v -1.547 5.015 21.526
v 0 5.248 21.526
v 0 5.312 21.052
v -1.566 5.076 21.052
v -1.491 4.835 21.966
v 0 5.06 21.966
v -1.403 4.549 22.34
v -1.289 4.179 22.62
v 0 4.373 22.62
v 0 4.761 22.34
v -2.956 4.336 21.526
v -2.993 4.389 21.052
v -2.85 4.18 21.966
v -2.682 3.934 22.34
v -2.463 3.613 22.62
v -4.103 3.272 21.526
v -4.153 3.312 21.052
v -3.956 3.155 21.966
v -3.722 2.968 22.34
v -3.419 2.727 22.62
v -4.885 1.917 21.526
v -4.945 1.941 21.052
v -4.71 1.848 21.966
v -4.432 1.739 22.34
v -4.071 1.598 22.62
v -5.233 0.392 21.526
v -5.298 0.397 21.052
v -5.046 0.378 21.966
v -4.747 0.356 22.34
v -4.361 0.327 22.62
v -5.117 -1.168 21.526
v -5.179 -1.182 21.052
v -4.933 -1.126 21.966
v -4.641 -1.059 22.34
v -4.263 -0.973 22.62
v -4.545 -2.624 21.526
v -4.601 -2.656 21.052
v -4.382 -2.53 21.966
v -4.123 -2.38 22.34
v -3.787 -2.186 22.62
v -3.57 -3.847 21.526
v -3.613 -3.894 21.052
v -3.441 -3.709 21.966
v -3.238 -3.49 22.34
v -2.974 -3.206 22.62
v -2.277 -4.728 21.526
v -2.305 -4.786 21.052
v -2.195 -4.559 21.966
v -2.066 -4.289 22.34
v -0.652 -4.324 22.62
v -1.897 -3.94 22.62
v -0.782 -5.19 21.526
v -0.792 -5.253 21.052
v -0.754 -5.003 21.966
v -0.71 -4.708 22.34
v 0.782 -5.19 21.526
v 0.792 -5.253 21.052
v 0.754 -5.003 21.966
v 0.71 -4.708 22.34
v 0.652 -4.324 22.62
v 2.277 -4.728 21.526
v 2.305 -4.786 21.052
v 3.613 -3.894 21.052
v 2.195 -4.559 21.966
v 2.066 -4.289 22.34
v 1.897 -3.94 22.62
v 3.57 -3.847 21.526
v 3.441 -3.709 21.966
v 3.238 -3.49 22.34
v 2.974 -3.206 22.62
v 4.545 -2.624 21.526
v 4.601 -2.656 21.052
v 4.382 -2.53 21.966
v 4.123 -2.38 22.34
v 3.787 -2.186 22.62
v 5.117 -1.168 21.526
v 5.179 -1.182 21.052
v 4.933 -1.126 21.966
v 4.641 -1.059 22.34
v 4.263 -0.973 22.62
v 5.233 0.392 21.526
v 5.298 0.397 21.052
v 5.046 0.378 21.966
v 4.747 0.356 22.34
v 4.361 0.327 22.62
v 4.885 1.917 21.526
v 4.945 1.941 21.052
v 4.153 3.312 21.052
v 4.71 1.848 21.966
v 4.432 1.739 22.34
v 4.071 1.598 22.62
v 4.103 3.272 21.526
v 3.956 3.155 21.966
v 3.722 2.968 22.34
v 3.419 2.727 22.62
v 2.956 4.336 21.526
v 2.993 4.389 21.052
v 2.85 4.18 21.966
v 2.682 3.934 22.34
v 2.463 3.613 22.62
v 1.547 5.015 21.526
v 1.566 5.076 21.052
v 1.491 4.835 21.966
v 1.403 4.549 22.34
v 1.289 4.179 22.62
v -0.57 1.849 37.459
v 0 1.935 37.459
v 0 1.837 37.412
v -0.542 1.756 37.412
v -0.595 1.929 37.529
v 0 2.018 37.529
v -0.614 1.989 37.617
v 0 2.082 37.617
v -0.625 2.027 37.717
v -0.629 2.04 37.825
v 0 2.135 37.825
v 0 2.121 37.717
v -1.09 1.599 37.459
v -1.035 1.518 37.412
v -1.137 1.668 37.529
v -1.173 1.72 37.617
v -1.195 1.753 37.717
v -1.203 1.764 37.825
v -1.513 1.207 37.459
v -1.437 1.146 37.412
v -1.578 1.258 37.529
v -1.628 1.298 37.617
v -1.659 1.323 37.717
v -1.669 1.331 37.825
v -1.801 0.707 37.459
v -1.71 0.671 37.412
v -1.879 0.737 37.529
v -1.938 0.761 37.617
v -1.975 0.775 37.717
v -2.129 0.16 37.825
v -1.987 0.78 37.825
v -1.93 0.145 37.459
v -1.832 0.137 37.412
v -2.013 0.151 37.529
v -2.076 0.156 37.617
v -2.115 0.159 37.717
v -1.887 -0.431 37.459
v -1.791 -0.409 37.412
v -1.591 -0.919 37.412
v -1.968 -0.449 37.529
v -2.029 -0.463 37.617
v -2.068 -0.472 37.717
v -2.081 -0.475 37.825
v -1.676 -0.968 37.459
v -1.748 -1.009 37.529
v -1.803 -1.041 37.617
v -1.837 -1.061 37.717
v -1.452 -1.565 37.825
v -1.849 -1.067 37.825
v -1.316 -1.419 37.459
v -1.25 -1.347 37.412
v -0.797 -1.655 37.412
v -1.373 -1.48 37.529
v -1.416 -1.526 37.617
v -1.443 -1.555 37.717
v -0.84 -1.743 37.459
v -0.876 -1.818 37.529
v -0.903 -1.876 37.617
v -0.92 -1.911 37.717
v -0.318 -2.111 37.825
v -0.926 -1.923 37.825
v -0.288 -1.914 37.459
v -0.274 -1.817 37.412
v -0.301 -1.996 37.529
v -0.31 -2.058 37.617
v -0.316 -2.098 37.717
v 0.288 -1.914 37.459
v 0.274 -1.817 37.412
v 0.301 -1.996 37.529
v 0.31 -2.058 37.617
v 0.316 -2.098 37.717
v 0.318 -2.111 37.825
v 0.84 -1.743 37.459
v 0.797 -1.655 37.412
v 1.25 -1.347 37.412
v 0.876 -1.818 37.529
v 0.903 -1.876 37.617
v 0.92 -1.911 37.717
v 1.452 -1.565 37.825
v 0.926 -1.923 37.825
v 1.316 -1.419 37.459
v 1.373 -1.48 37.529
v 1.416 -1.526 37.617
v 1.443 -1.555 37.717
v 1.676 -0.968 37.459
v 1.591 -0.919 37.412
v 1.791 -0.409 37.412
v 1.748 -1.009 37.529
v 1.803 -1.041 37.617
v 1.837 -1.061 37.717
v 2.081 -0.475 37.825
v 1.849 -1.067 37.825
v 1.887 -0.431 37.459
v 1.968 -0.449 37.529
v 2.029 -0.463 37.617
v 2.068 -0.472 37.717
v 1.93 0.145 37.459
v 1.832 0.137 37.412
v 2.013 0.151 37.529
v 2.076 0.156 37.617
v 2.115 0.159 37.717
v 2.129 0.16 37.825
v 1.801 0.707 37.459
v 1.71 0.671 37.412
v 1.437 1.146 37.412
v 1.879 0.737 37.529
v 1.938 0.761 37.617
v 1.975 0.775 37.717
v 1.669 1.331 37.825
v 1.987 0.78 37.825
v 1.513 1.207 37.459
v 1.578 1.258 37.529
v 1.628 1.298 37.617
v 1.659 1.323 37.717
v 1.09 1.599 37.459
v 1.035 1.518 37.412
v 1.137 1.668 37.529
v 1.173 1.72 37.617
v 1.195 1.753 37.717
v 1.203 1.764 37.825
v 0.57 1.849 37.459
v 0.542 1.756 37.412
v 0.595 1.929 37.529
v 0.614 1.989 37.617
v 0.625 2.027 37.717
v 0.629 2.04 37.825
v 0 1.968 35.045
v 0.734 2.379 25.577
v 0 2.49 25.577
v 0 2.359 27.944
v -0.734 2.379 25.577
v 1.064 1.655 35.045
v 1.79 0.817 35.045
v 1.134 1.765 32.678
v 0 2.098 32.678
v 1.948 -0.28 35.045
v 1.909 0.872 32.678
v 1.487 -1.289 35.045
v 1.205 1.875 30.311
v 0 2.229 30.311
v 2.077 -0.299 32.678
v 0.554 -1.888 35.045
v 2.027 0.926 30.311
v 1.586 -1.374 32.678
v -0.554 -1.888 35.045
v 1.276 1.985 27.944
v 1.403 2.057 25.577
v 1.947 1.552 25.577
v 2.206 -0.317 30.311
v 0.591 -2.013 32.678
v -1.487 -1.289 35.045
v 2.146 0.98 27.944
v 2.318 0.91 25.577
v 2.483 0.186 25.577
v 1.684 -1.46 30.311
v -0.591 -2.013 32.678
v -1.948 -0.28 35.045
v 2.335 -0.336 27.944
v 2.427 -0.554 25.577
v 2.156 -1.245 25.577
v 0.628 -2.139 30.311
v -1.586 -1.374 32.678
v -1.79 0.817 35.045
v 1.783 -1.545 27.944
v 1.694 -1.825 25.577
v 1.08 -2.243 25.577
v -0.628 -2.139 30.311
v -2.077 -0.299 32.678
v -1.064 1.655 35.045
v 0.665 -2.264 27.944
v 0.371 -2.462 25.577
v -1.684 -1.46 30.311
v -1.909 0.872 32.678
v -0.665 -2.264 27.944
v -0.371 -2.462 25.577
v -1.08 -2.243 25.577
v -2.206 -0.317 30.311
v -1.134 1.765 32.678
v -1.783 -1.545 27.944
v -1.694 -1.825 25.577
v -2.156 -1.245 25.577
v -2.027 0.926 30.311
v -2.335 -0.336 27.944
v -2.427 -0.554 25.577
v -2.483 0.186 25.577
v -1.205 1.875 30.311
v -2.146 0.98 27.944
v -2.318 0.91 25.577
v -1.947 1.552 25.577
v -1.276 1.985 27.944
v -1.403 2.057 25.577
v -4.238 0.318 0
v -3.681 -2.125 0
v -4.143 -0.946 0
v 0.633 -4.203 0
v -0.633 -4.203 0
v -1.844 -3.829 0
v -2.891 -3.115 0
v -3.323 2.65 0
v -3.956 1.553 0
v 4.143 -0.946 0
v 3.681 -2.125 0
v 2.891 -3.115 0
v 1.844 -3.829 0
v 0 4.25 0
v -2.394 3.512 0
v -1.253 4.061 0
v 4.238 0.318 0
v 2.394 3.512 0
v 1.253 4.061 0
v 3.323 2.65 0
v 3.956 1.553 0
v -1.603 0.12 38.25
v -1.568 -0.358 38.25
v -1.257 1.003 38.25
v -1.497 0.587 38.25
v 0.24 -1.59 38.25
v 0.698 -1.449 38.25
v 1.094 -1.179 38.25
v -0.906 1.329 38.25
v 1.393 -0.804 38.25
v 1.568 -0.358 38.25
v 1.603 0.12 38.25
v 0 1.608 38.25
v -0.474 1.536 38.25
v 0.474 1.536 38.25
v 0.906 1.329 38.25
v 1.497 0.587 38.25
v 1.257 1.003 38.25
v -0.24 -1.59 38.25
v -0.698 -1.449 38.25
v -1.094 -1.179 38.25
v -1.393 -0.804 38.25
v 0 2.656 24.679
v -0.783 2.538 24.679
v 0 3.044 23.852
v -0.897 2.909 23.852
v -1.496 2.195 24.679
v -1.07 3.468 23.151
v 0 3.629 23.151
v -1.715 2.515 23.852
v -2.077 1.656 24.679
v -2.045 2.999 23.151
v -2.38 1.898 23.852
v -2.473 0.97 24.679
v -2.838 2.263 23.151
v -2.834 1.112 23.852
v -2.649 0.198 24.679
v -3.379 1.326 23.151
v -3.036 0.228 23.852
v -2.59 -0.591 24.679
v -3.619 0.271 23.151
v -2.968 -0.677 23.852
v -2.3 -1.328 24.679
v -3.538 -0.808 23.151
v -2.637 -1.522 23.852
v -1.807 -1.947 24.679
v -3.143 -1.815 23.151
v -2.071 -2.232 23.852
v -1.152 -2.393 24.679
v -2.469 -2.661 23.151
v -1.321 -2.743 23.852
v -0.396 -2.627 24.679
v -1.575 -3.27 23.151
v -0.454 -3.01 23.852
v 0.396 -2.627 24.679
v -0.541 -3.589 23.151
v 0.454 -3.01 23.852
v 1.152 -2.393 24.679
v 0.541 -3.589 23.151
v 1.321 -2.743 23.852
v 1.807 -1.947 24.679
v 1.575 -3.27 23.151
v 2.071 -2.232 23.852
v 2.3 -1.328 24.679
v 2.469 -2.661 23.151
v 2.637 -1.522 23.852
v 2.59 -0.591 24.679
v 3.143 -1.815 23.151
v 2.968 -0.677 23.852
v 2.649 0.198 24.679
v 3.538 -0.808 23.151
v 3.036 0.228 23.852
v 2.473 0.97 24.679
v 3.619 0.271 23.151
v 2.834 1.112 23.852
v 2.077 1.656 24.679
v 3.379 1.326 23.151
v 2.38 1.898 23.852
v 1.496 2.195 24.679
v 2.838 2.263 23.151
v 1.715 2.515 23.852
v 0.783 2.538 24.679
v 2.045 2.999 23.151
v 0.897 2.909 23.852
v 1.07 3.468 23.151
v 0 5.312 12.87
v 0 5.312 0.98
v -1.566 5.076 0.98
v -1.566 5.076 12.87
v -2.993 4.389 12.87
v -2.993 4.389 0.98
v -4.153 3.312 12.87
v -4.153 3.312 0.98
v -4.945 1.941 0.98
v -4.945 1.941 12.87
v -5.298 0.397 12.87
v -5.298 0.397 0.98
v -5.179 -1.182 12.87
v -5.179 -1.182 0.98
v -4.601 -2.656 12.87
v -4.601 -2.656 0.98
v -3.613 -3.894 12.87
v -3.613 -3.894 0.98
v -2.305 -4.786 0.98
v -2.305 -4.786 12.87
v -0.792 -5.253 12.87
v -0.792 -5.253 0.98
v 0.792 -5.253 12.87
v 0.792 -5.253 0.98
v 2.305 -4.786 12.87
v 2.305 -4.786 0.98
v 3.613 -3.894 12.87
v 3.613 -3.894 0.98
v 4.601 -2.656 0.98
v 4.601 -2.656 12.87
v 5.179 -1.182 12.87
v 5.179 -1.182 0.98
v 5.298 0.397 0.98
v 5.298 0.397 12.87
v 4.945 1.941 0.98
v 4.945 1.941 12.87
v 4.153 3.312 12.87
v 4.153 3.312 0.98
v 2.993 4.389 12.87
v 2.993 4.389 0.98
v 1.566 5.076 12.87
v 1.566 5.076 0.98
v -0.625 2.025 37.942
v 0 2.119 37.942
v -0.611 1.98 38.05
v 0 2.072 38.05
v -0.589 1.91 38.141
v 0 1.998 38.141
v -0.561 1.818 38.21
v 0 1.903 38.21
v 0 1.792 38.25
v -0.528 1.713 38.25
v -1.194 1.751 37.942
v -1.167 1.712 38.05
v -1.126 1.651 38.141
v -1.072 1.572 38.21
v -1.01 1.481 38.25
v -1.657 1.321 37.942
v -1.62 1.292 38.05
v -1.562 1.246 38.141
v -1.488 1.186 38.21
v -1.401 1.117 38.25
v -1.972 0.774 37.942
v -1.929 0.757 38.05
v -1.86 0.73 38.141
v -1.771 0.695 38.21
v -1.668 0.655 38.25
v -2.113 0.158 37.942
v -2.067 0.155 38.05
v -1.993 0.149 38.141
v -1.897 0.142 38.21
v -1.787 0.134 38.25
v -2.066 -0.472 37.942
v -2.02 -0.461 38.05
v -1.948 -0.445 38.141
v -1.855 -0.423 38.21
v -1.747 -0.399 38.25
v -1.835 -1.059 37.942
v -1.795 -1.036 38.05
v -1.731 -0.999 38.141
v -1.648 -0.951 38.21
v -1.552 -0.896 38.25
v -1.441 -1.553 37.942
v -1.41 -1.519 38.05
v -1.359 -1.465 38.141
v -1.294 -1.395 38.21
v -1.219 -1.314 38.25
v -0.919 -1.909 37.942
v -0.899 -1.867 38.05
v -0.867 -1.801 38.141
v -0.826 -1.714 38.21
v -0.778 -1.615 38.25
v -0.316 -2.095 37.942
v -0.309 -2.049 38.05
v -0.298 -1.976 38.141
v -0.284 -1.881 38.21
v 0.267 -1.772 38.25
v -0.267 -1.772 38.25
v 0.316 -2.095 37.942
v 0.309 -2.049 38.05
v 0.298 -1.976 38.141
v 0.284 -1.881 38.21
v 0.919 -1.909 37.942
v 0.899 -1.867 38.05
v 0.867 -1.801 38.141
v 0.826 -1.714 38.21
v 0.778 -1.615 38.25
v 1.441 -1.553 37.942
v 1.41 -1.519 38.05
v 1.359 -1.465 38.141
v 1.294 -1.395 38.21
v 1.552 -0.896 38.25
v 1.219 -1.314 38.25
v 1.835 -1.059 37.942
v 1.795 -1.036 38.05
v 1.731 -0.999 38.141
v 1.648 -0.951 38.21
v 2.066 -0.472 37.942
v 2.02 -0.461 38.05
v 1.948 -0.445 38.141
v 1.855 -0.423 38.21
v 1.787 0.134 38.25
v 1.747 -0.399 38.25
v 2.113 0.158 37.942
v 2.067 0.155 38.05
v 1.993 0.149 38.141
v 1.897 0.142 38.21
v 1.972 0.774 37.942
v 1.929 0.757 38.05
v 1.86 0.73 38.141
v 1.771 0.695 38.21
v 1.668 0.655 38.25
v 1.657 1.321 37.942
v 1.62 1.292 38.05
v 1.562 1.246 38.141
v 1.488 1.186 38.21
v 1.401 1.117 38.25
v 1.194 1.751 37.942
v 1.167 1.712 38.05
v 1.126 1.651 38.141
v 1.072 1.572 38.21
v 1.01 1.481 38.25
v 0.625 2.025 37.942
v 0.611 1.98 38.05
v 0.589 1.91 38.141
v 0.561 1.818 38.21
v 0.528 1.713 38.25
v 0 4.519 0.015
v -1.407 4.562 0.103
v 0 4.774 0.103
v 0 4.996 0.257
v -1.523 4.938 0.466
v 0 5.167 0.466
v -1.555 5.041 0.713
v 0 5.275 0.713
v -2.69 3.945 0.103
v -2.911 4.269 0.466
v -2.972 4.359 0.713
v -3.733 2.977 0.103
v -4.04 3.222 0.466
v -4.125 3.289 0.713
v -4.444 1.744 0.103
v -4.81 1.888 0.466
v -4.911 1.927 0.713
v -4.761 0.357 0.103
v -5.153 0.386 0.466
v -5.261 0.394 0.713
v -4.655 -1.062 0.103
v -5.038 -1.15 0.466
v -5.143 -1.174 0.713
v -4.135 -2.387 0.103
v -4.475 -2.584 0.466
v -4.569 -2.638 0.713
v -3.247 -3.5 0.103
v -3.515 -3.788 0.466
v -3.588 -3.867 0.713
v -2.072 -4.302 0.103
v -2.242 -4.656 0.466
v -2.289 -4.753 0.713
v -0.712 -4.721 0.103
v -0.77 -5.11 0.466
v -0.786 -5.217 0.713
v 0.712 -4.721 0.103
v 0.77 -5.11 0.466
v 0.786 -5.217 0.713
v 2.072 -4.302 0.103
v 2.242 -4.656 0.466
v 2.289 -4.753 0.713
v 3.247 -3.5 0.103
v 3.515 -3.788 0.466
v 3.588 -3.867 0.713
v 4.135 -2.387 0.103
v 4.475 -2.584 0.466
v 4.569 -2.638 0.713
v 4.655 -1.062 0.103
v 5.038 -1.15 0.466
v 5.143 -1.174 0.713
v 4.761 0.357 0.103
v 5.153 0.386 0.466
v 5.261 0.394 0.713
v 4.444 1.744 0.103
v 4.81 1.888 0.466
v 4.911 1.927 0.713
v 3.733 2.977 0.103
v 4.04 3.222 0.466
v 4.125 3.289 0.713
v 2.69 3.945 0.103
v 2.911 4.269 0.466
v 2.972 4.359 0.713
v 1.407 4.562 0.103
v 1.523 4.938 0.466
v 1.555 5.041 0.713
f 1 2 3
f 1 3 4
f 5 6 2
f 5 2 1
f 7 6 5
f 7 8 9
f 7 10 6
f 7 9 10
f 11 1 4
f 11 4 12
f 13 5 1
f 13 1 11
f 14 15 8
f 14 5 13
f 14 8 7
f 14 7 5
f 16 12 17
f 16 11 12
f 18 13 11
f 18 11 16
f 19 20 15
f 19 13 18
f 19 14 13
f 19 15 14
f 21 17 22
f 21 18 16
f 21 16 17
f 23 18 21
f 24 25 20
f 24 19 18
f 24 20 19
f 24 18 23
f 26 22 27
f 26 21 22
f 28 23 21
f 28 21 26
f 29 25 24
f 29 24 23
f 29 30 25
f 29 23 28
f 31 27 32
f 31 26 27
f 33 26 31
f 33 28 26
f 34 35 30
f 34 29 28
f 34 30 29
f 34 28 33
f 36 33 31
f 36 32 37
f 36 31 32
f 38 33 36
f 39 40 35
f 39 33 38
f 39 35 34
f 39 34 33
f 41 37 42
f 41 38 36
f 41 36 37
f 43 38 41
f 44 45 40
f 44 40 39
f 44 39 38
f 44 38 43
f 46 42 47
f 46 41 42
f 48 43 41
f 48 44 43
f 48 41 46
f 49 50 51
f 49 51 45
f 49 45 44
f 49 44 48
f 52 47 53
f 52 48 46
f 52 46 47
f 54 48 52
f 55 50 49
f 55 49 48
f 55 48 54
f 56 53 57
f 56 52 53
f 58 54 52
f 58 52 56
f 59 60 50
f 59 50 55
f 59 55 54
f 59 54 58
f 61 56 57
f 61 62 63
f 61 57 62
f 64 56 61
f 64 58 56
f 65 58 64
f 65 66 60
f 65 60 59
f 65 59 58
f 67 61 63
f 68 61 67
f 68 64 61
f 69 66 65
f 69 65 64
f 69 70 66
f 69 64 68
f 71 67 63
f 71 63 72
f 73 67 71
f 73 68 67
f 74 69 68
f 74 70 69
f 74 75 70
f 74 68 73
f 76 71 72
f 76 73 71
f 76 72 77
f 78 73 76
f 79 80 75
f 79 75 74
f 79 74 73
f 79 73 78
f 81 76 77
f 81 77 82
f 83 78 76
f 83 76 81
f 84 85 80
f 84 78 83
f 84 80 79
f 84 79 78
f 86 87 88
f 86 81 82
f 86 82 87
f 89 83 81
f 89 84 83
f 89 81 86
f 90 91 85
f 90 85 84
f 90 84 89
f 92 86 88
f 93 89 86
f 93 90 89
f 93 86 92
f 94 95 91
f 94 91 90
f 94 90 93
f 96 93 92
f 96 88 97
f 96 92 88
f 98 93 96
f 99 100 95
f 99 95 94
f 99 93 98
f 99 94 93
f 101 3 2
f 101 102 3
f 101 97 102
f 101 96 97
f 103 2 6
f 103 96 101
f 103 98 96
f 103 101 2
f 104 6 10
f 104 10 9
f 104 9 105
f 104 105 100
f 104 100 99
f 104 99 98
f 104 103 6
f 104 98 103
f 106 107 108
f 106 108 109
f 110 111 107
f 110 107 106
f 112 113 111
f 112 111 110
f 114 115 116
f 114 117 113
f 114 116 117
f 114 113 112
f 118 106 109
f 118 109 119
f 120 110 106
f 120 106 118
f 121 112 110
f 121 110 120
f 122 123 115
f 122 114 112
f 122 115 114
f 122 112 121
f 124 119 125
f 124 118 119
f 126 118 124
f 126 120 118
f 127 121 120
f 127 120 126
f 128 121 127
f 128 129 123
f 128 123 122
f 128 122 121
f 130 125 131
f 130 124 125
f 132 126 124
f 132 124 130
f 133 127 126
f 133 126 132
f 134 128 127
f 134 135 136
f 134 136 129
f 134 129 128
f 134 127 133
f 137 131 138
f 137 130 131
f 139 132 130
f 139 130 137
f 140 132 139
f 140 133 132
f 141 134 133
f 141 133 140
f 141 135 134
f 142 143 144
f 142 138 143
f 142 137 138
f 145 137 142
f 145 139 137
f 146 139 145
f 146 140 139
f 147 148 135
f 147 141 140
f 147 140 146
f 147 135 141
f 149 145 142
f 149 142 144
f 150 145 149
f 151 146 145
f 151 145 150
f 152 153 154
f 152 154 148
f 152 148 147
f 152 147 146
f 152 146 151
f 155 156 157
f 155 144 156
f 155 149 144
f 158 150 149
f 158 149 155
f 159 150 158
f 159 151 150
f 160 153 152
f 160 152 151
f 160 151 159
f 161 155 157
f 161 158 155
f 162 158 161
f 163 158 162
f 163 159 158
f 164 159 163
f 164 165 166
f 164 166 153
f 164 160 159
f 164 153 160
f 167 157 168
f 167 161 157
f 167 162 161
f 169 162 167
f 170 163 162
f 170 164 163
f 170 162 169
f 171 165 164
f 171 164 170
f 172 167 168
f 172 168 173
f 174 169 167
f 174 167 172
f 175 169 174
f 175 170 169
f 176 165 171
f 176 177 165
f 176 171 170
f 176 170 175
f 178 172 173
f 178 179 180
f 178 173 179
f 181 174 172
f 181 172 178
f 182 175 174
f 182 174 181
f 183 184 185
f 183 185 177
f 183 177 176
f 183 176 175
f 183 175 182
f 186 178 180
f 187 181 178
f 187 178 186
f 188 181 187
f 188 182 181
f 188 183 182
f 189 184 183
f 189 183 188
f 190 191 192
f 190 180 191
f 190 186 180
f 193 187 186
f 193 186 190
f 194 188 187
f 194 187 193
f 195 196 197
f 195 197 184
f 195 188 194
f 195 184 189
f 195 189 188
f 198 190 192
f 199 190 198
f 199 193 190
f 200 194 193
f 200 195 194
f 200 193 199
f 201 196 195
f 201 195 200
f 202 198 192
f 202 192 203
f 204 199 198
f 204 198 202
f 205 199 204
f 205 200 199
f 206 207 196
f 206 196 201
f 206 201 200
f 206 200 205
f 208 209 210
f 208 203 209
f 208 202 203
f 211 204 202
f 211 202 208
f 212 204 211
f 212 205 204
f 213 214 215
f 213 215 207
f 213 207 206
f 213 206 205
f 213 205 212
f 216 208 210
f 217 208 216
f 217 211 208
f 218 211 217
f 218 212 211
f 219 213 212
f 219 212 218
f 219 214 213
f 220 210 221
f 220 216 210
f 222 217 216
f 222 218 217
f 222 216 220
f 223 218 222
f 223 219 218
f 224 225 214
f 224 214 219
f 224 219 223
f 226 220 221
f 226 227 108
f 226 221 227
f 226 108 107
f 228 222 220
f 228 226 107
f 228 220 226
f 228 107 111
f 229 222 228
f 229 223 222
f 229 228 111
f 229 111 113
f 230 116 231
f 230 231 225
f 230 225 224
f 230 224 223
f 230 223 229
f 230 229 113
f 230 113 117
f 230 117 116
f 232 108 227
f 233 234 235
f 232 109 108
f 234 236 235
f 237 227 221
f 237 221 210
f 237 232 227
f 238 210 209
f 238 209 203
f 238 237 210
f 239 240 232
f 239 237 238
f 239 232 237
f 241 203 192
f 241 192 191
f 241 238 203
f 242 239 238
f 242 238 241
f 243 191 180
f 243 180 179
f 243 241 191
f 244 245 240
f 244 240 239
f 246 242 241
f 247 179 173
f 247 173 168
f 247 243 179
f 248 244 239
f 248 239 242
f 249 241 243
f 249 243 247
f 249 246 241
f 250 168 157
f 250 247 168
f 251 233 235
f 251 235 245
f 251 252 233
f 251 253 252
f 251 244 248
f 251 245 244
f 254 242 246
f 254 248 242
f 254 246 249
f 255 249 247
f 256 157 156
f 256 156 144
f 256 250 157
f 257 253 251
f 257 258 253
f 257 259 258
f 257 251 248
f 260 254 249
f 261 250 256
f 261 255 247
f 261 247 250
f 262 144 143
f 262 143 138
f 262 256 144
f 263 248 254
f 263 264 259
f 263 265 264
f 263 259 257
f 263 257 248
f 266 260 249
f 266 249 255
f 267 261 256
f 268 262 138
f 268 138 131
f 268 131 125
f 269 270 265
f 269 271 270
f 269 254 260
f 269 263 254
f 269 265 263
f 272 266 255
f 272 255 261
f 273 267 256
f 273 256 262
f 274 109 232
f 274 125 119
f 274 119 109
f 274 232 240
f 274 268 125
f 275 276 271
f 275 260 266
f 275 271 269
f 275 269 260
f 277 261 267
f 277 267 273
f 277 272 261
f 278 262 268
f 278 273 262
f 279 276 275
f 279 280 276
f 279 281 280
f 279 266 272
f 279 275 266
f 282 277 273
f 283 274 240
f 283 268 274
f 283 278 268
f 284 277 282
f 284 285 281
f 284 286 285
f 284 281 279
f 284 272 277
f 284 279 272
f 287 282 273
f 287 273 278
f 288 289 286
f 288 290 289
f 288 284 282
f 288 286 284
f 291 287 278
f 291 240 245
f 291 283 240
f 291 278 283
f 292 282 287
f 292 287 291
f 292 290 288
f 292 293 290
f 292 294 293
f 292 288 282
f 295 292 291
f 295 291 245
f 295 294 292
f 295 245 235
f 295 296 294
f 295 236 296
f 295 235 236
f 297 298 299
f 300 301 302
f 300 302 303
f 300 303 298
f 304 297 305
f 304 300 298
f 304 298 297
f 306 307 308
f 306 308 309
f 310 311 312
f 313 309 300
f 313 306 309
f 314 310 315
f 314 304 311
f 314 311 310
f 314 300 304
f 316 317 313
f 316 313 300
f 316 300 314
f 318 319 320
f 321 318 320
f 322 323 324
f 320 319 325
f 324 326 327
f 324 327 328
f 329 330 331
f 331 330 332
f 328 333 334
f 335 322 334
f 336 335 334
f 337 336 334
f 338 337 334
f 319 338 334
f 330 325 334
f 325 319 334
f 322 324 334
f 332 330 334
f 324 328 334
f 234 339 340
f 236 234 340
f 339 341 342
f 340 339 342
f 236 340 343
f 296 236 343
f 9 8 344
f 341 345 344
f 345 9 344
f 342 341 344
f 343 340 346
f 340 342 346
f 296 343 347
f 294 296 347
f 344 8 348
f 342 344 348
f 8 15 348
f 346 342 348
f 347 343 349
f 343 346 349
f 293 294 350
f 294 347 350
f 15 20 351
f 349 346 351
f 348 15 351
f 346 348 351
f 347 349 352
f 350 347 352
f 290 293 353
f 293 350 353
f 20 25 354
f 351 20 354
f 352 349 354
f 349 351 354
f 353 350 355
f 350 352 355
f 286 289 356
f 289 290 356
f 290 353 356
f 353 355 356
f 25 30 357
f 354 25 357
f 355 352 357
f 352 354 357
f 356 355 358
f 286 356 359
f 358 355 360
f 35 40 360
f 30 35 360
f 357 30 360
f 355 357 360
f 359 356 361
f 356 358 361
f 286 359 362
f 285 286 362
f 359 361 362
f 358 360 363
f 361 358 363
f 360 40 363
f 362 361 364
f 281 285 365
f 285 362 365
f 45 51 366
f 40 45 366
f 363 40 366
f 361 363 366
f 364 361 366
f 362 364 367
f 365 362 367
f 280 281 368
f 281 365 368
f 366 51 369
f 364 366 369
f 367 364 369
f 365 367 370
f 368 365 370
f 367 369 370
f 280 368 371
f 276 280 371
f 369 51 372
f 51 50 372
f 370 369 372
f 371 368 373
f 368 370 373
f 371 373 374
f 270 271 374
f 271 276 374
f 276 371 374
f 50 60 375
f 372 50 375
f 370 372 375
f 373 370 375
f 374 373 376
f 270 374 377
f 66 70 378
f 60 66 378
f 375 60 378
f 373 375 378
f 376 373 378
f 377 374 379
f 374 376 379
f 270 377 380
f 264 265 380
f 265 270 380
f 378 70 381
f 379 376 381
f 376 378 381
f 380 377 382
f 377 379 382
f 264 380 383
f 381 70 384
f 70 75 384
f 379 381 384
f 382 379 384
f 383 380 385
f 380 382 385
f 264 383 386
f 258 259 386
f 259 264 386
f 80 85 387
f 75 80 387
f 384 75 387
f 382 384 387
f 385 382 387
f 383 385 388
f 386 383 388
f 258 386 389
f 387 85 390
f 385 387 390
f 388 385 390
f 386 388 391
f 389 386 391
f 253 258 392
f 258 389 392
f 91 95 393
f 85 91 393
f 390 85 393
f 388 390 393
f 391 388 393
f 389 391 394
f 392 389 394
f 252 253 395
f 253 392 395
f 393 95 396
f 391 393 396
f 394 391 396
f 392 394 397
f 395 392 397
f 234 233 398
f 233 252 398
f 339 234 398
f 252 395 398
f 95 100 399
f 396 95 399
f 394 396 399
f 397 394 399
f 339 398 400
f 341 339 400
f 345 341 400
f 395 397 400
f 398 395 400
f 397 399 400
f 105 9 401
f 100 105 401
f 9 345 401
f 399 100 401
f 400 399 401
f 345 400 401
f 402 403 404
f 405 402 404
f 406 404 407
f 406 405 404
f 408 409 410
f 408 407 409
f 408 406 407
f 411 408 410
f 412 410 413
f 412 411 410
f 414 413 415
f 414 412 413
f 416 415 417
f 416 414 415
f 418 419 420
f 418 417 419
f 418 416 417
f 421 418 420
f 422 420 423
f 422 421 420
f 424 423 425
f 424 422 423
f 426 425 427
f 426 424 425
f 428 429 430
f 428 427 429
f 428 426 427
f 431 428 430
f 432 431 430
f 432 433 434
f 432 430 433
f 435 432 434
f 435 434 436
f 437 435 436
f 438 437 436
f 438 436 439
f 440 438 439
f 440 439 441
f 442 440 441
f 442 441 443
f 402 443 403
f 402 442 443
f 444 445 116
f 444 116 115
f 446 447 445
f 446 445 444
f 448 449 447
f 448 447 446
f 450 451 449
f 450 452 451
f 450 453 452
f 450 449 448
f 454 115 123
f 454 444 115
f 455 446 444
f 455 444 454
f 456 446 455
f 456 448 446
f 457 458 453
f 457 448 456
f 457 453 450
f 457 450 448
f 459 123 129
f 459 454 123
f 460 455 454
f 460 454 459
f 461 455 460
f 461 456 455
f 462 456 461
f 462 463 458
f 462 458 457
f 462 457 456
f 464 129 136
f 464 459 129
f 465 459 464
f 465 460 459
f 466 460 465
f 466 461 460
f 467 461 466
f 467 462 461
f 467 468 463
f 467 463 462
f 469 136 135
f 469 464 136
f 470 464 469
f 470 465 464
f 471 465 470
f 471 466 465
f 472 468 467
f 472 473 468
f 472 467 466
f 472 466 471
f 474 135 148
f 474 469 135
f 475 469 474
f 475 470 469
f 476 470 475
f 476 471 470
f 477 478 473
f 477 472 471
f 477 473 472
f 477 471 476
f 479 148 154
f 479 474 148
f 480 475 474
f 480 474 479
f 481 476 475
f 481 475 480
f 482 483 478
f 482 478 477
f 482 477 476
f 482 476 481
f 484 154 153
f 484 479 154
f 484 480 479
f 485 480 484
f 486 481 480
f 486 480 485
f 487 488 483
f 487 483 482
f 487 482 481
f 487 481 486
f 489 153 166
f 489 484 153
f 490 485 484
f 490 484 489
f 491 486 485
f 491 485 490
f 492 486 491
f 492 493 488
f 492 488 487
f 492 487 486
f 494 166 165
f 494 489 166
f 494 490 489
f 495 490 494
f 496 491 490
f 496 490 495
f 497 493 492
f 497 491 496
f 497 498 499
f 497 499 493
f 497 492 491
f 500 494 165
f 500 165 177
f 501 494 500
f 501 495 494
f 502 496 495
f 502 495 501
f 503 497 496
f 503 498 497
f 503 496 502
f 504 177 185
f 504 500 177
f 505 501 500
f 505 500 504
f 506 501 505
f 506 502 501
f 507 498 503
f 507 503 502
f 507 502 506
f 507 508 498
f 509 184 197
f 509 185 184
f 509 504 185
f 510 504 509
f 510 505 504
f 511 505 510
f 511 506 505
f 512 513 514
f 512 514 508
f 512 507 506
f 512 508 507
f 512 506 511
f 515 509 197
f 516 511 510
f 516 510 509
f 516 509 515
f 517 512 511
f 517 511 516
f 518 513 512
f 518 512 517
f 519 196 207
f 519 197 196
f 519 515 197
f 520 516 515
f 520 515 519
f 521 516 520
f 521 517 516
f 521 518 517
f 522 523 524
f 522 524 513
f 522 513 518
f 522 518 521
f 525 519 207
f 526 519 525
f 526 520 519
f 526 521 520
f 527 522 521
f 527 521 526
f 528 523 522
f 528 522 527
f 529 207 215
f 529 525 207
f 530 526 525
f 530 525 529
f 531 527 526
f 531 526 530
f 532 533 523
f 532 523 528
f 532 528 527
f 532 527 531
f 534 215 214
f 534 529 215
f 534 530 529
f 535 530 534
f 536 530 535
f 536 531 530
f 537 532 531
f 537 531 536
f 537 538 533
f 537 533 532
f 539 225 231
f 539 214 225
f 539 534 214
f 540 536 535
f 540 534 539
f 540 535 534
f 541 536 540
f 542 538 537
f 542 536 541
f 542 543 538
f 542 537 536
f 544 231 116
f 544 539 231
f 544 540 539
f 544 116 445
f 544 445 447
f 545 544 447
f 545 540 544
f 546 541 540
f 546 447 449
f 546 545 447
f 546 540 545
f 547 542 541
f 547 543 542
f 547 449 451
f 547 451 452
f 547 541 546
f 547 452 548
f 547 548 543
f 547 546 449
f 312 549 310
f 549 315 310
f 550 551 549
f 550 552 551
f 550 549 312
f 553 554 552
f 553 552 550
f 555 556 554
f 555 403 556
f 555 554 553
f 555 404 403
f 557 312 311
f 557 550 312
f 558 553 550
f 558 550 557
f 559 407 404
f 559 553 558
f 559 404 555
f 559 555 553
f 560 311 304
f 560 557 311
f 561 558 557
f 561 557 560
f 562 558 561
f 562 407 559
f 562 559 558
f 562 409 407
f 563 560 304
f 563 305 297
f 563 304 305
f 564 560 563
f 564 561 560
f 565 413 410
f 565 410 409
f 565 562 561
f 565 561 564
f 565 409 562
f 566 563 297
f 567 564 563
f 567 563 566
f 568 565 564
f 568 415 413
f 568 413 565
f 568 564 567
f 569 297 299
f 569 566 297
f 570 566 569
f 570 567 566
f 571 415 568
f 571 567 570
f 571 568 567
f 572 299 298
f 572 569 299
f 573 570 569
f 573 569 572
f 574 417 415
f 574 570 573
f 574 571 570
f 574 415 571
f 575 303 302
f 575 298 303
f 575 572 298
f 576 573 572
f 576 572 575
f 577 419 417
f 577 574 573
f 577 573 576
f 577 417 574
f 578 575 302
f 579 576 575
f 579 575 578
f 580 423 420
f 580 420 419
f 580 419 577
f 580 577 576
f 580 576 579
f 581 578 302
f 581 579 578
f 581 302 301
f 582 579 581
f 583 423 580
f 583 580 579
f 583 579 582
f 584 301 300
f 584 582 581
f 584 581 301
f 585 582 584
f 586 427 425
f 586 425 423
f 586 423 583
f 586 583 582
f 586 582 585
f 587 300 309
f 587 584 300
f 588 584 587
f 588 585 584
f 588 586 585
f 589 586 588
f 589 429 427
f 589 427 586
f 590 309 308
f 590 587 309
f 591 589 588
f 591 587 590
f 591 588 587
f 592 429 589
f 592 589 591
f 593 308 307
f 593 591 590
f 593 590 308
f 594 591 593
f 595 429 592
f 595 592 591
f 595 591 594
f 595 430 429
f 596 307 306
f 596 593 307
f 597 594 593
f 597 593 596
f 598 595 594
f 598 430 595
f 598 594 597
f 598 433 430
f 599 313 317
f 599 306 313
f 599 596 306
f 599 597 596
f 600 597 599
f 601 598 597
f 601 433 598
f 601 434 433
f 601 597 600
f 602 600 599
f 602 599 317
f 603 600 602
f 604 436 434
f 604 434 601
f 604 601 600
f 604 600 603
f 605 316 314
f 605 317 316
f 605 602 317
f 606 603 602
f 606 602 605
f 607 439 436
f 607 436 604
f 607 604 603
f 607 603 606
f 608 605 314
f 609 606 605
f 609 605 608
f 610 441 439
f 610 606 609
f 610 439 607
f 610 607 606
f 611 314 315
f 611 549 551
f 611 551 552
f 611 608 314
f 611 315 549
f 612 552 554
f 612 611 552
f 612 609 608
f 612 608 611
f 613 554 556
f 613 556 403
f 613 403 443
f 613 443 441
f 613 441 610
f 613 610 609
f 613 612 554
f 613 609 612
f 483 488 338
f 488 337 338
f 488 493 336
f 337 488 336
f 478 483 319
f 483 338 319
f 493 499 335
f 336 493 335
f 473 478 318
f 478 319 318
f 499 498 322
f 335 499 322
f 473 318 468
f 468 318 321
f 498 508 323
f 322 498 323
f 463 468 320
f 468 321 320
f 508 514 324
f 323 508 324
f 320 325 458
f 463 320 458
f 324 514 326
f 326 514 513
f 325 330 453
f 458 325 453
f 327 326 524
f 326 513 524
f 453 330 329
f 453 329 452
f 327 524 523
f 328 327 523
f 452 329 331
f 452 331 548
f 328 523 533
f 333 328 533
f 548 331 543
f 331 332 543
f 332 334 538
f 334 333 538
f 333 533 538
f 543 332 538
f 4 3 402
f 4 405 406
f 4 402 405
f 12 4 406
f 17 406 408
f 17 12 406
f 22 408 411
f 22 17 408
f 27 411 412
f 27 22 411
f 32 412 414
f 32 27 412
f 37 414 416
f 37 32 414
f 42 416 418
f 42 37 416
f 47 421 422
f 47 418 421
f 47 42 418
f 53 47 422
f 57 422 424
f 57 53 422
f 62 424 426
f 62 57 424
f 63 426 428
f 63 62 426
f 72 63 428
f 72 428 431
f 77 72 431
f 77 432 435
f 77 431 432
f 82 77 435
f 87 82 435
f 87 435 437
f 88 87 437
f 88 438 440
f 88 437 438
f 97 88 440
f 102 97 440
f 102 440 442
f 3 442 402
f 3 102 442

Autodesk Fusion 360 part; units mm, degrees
sketch "Sketch1" plane through (0, 0, 0) normal (1, 0, 0) x (0, 1, 0)
  line L0 (0, 0) -> (0, 45) construction
  line L1 (0, 0) -> (6.25, 0)
  line L2 (6.25, 0) -> (6.25, 15.1414)
  line L3 (0, 45) -> (2.1084, 45)
  line L4 (0, 45) -> (0, 0)
  arc A0 (5, 0) -> (6.25, 1.1529) centre (5.0934, 1.1529) ccw
  line L5 (2.1616, 44.0146) -> (2.9293, 30.0902)
  arc A1 (2.9293, 30.0902) -> (5.1447, 26.6121) centre (7.1308, 30.3218) ccw
  line L6 (6.25, 15.1414) -> (6.25, 24.7666)
  arc A2 (6.25, 24.7666) -> (5.1447, 26.6121) centre (4.1566, 24.7666) ccw
  circle A3 centre (2, 44.5) radius 0.5116
  dimension "d1" = 45
  dimension "d2" = 6.25
revolve "Revolve5" add sketch "Sketch1" angle 360 about axis through (0, 0, 45) along (0, 0, -1) contours L1 L2 L3 L4 A0 L5 A1 L6 A2 A3 | L3 A3 picked at (1.8629, 44.6458)
scale "Scale1" factor 0.85 about (0, 0, 0) bodies 1
